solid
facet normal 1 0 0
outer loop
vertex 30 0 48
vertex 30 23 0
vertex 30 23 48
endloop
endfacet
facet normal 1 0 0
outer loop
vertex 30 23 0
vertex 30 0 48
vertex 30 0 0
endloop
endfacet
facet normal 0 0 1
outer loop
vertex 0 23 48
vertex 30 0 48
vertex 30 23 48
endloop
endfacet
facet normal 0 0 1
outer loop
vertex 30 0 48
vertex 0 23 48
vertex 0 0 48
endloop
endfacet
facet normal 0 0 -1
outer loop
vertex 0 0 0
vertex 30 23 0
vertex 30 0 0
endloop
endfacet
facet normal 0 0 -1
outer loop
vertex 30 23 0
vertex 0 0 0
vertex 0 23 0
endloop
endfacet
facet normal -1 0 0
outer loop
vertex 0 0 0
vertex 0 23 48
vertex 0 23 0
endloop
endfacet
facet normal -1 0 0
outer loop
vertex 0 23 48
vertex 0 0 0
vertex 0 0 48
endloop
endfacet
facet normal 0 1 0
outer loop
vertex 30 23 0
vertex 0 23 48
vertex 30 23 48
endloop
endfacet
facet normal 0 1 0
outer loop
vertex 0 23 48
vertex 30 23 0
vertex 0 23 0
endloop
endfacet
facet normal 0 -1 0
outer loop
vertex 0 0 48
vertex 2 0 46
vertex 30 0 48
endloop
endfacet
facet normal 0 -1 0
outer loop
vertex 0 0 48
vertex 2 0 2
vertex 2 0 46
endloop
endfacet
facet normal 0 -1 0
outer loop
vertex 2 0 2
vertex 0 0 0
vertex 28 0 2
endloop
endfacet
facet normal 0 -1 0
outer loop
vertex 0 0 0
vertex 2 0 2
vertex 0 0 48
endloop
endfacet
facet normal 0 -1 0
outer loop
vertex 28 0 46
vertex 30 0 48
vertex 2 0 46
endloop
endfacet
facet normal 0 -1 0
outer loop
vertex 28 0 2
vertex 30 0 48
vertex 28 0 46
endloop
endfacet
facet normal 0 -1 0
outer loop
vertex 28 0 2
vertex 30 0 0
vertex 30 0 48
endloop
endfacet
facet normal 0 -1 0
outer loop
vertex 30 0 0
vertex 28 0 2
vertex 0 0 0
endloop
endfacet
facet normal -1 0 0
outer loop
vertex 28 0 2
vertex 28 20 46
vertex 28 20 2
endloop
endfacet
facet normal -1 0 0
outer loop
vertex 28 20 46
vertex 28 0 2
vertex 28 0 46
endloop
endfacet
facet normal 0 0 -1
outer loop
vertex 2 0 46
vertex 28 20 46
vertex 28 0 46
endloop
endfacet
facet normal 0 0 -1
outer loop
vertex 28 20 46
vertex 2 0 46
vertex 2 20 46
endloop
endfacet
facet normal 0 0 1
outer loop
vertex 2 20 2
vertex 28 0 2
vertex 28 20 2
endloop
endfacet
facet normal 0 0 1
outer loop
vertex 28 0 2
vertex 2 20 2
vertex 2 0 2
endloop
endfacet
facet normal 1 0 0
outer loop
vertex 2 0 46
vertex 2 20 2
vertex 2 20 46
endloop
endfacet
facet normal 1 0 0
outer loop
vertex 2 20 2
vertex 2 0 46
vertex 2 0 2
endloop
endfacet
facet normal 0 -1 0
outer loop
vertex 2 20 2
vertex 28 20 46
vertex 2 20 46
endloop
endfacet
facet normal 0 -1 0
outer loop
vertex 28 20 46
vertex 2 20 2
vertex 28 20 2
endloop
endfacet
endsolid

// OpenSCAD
/**
@title: Project Ding Dong encasing
@author: Ronny Majani
**/
/* Module Definitions */
/*
Creates a block in the dimensions of the chassis
This module uses the globally defined width, height, and depth variables
*/
module chassis_fill(width, height, depth) {
    dimensions = [
        width,
        depth,
        height
    ];
    cube(dimensions);
}

/*
Creates the chassis' hull which is a an outer shell with empty space inside
@param thickness: the thickness of the chassis' inner walls
@param depth: the depth of the inner space
*/
module chassis_hull(width, height, outer_depth, inner_depth, thickness) {
    offset_fix = 0.1;
    inner_dimensions = [
        width - thickness*2,
        inner_depth + offset_fix,
        height - thickness*2
    ];
    difference() {
        chassis_fill(width, height, outer_depth);
        translate([thickness, -offset_fix, thickness]) {
            resize(inner_dimensions) chassis_fill();
        }
    }
}



/* Generate Chassis */
chassis_outer_width = 30;
chassis_outer_height = 48;
chassis_outer_depth = 23;
chassis_inner_depth = 20;
chassis_thickness = 2;
chassis_hull(chassis_outer_width,
            chassis_outer_height,
            chassis_outer_depth,
            chassis_inner_depth,
            chassis_thickness);
